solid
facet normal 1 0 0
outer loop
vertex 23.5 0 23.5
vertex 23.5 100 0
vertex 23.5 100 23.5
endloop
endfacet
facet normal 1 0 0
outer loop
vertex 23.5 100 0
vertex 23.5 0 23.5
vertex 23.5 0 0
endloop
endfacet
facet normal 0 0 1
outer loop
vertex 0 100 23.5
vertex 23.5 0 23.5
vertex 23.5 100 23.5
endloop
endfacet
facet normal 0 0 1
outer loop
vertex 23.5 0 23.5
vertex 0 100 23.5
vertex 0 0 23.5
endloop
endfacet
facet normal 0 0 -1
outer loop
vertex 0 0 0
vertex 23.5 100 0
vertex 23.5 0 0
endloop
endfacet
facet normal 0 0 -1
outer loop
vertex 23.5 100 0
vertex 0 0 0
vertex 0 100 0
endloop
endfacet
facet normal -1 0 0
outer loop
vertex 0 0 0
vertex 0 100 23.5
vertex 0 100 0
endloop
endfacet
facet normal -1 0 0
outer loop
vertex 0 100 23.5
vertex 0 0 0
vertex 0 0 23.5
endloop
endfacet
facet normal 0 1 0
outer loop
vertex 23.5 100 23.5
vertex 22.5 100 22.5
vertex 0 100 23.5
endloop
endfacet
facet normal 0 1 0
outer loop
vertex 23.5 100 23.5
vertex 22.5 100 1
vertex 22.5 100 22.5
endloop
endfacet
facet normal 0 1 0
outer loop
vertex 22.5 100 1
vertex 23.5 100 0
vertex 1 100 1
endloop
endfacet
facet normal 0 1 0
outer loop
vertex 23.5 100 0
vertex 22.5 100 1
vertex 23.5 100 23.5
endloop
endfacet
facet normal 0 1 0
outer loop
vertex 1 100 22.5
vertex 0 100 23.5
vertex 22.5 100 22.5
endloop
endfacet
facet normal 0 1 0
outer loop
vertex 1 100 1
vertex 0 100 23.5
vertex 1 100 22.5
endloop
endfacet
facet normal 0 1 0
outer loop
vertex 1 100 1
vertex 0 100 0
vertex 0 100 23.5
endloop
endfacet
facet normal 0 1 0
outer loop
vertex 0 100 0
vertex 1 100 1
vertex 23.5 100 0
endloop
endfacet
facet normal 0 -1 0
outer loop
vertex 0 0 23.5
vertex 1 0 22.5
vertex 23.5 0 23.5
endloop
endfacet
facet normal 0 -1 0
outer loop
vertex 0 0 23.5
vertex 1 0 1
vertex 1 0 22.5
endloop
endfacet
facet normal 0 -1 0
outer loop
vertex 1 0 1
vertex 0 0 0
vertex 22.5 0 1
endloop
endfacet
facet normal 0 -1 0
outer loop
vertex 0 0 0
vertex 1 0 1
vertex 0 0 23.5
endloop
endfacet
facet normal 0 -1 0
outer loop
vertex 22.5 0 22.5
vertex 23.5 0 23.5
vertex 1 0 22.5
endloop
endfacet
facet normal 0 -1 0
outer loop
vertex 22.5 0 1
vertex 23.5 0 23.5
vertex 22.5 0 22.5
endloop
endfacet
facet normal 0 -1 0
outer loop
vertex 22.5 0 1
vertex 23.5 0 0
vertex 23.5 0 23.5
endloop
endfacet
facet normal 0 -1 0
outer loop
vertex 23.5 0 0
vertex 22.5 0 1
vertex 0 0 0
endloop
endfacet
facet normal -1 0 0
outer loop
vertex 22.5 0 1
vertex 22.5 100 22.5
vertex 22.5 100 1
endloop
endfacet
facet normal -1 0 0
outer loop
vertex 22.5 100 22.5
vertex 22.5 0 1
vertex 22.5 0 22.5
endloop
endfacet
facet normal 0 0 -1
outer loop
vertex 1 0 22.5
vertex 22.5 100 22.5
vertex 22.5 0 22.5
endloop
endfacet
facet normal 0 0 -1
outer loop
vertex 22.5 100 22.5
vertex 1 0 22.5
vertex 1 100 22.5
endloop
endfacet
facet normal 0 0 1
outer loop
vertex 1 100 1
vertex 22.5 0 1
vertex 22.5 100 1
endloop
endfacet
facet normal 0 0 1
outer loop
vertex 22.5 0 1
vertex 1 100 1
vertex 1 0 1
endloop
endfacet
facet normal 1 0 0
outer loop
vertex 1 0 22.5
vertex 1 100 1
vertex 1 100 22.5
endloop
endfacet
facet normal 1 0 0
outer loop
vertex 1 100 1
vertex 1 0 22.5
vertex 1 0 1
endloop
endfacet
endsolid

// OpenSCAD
// en: square tube
// fr: tube carré
// Bricorama 25004802
// https://www.bricorama.fr/p/tube-carre-pour-m20-23.5-aluminium-brut-2.5m/4001116251900

function square_tube_width() = 23.5;

function square_tube_depth() = 1;

module square_tube(length) {
  inner_width = square_tube_width()-2*square_tube_depth();

  difference() {
    cube([square_tube_width(), length, square_tube_width()]);

    translate([square_tube_depth(), -1, square_tube_depth()])
      cube([inner_width, length+2, inner_width]);
  }
}

square_tube(100);
